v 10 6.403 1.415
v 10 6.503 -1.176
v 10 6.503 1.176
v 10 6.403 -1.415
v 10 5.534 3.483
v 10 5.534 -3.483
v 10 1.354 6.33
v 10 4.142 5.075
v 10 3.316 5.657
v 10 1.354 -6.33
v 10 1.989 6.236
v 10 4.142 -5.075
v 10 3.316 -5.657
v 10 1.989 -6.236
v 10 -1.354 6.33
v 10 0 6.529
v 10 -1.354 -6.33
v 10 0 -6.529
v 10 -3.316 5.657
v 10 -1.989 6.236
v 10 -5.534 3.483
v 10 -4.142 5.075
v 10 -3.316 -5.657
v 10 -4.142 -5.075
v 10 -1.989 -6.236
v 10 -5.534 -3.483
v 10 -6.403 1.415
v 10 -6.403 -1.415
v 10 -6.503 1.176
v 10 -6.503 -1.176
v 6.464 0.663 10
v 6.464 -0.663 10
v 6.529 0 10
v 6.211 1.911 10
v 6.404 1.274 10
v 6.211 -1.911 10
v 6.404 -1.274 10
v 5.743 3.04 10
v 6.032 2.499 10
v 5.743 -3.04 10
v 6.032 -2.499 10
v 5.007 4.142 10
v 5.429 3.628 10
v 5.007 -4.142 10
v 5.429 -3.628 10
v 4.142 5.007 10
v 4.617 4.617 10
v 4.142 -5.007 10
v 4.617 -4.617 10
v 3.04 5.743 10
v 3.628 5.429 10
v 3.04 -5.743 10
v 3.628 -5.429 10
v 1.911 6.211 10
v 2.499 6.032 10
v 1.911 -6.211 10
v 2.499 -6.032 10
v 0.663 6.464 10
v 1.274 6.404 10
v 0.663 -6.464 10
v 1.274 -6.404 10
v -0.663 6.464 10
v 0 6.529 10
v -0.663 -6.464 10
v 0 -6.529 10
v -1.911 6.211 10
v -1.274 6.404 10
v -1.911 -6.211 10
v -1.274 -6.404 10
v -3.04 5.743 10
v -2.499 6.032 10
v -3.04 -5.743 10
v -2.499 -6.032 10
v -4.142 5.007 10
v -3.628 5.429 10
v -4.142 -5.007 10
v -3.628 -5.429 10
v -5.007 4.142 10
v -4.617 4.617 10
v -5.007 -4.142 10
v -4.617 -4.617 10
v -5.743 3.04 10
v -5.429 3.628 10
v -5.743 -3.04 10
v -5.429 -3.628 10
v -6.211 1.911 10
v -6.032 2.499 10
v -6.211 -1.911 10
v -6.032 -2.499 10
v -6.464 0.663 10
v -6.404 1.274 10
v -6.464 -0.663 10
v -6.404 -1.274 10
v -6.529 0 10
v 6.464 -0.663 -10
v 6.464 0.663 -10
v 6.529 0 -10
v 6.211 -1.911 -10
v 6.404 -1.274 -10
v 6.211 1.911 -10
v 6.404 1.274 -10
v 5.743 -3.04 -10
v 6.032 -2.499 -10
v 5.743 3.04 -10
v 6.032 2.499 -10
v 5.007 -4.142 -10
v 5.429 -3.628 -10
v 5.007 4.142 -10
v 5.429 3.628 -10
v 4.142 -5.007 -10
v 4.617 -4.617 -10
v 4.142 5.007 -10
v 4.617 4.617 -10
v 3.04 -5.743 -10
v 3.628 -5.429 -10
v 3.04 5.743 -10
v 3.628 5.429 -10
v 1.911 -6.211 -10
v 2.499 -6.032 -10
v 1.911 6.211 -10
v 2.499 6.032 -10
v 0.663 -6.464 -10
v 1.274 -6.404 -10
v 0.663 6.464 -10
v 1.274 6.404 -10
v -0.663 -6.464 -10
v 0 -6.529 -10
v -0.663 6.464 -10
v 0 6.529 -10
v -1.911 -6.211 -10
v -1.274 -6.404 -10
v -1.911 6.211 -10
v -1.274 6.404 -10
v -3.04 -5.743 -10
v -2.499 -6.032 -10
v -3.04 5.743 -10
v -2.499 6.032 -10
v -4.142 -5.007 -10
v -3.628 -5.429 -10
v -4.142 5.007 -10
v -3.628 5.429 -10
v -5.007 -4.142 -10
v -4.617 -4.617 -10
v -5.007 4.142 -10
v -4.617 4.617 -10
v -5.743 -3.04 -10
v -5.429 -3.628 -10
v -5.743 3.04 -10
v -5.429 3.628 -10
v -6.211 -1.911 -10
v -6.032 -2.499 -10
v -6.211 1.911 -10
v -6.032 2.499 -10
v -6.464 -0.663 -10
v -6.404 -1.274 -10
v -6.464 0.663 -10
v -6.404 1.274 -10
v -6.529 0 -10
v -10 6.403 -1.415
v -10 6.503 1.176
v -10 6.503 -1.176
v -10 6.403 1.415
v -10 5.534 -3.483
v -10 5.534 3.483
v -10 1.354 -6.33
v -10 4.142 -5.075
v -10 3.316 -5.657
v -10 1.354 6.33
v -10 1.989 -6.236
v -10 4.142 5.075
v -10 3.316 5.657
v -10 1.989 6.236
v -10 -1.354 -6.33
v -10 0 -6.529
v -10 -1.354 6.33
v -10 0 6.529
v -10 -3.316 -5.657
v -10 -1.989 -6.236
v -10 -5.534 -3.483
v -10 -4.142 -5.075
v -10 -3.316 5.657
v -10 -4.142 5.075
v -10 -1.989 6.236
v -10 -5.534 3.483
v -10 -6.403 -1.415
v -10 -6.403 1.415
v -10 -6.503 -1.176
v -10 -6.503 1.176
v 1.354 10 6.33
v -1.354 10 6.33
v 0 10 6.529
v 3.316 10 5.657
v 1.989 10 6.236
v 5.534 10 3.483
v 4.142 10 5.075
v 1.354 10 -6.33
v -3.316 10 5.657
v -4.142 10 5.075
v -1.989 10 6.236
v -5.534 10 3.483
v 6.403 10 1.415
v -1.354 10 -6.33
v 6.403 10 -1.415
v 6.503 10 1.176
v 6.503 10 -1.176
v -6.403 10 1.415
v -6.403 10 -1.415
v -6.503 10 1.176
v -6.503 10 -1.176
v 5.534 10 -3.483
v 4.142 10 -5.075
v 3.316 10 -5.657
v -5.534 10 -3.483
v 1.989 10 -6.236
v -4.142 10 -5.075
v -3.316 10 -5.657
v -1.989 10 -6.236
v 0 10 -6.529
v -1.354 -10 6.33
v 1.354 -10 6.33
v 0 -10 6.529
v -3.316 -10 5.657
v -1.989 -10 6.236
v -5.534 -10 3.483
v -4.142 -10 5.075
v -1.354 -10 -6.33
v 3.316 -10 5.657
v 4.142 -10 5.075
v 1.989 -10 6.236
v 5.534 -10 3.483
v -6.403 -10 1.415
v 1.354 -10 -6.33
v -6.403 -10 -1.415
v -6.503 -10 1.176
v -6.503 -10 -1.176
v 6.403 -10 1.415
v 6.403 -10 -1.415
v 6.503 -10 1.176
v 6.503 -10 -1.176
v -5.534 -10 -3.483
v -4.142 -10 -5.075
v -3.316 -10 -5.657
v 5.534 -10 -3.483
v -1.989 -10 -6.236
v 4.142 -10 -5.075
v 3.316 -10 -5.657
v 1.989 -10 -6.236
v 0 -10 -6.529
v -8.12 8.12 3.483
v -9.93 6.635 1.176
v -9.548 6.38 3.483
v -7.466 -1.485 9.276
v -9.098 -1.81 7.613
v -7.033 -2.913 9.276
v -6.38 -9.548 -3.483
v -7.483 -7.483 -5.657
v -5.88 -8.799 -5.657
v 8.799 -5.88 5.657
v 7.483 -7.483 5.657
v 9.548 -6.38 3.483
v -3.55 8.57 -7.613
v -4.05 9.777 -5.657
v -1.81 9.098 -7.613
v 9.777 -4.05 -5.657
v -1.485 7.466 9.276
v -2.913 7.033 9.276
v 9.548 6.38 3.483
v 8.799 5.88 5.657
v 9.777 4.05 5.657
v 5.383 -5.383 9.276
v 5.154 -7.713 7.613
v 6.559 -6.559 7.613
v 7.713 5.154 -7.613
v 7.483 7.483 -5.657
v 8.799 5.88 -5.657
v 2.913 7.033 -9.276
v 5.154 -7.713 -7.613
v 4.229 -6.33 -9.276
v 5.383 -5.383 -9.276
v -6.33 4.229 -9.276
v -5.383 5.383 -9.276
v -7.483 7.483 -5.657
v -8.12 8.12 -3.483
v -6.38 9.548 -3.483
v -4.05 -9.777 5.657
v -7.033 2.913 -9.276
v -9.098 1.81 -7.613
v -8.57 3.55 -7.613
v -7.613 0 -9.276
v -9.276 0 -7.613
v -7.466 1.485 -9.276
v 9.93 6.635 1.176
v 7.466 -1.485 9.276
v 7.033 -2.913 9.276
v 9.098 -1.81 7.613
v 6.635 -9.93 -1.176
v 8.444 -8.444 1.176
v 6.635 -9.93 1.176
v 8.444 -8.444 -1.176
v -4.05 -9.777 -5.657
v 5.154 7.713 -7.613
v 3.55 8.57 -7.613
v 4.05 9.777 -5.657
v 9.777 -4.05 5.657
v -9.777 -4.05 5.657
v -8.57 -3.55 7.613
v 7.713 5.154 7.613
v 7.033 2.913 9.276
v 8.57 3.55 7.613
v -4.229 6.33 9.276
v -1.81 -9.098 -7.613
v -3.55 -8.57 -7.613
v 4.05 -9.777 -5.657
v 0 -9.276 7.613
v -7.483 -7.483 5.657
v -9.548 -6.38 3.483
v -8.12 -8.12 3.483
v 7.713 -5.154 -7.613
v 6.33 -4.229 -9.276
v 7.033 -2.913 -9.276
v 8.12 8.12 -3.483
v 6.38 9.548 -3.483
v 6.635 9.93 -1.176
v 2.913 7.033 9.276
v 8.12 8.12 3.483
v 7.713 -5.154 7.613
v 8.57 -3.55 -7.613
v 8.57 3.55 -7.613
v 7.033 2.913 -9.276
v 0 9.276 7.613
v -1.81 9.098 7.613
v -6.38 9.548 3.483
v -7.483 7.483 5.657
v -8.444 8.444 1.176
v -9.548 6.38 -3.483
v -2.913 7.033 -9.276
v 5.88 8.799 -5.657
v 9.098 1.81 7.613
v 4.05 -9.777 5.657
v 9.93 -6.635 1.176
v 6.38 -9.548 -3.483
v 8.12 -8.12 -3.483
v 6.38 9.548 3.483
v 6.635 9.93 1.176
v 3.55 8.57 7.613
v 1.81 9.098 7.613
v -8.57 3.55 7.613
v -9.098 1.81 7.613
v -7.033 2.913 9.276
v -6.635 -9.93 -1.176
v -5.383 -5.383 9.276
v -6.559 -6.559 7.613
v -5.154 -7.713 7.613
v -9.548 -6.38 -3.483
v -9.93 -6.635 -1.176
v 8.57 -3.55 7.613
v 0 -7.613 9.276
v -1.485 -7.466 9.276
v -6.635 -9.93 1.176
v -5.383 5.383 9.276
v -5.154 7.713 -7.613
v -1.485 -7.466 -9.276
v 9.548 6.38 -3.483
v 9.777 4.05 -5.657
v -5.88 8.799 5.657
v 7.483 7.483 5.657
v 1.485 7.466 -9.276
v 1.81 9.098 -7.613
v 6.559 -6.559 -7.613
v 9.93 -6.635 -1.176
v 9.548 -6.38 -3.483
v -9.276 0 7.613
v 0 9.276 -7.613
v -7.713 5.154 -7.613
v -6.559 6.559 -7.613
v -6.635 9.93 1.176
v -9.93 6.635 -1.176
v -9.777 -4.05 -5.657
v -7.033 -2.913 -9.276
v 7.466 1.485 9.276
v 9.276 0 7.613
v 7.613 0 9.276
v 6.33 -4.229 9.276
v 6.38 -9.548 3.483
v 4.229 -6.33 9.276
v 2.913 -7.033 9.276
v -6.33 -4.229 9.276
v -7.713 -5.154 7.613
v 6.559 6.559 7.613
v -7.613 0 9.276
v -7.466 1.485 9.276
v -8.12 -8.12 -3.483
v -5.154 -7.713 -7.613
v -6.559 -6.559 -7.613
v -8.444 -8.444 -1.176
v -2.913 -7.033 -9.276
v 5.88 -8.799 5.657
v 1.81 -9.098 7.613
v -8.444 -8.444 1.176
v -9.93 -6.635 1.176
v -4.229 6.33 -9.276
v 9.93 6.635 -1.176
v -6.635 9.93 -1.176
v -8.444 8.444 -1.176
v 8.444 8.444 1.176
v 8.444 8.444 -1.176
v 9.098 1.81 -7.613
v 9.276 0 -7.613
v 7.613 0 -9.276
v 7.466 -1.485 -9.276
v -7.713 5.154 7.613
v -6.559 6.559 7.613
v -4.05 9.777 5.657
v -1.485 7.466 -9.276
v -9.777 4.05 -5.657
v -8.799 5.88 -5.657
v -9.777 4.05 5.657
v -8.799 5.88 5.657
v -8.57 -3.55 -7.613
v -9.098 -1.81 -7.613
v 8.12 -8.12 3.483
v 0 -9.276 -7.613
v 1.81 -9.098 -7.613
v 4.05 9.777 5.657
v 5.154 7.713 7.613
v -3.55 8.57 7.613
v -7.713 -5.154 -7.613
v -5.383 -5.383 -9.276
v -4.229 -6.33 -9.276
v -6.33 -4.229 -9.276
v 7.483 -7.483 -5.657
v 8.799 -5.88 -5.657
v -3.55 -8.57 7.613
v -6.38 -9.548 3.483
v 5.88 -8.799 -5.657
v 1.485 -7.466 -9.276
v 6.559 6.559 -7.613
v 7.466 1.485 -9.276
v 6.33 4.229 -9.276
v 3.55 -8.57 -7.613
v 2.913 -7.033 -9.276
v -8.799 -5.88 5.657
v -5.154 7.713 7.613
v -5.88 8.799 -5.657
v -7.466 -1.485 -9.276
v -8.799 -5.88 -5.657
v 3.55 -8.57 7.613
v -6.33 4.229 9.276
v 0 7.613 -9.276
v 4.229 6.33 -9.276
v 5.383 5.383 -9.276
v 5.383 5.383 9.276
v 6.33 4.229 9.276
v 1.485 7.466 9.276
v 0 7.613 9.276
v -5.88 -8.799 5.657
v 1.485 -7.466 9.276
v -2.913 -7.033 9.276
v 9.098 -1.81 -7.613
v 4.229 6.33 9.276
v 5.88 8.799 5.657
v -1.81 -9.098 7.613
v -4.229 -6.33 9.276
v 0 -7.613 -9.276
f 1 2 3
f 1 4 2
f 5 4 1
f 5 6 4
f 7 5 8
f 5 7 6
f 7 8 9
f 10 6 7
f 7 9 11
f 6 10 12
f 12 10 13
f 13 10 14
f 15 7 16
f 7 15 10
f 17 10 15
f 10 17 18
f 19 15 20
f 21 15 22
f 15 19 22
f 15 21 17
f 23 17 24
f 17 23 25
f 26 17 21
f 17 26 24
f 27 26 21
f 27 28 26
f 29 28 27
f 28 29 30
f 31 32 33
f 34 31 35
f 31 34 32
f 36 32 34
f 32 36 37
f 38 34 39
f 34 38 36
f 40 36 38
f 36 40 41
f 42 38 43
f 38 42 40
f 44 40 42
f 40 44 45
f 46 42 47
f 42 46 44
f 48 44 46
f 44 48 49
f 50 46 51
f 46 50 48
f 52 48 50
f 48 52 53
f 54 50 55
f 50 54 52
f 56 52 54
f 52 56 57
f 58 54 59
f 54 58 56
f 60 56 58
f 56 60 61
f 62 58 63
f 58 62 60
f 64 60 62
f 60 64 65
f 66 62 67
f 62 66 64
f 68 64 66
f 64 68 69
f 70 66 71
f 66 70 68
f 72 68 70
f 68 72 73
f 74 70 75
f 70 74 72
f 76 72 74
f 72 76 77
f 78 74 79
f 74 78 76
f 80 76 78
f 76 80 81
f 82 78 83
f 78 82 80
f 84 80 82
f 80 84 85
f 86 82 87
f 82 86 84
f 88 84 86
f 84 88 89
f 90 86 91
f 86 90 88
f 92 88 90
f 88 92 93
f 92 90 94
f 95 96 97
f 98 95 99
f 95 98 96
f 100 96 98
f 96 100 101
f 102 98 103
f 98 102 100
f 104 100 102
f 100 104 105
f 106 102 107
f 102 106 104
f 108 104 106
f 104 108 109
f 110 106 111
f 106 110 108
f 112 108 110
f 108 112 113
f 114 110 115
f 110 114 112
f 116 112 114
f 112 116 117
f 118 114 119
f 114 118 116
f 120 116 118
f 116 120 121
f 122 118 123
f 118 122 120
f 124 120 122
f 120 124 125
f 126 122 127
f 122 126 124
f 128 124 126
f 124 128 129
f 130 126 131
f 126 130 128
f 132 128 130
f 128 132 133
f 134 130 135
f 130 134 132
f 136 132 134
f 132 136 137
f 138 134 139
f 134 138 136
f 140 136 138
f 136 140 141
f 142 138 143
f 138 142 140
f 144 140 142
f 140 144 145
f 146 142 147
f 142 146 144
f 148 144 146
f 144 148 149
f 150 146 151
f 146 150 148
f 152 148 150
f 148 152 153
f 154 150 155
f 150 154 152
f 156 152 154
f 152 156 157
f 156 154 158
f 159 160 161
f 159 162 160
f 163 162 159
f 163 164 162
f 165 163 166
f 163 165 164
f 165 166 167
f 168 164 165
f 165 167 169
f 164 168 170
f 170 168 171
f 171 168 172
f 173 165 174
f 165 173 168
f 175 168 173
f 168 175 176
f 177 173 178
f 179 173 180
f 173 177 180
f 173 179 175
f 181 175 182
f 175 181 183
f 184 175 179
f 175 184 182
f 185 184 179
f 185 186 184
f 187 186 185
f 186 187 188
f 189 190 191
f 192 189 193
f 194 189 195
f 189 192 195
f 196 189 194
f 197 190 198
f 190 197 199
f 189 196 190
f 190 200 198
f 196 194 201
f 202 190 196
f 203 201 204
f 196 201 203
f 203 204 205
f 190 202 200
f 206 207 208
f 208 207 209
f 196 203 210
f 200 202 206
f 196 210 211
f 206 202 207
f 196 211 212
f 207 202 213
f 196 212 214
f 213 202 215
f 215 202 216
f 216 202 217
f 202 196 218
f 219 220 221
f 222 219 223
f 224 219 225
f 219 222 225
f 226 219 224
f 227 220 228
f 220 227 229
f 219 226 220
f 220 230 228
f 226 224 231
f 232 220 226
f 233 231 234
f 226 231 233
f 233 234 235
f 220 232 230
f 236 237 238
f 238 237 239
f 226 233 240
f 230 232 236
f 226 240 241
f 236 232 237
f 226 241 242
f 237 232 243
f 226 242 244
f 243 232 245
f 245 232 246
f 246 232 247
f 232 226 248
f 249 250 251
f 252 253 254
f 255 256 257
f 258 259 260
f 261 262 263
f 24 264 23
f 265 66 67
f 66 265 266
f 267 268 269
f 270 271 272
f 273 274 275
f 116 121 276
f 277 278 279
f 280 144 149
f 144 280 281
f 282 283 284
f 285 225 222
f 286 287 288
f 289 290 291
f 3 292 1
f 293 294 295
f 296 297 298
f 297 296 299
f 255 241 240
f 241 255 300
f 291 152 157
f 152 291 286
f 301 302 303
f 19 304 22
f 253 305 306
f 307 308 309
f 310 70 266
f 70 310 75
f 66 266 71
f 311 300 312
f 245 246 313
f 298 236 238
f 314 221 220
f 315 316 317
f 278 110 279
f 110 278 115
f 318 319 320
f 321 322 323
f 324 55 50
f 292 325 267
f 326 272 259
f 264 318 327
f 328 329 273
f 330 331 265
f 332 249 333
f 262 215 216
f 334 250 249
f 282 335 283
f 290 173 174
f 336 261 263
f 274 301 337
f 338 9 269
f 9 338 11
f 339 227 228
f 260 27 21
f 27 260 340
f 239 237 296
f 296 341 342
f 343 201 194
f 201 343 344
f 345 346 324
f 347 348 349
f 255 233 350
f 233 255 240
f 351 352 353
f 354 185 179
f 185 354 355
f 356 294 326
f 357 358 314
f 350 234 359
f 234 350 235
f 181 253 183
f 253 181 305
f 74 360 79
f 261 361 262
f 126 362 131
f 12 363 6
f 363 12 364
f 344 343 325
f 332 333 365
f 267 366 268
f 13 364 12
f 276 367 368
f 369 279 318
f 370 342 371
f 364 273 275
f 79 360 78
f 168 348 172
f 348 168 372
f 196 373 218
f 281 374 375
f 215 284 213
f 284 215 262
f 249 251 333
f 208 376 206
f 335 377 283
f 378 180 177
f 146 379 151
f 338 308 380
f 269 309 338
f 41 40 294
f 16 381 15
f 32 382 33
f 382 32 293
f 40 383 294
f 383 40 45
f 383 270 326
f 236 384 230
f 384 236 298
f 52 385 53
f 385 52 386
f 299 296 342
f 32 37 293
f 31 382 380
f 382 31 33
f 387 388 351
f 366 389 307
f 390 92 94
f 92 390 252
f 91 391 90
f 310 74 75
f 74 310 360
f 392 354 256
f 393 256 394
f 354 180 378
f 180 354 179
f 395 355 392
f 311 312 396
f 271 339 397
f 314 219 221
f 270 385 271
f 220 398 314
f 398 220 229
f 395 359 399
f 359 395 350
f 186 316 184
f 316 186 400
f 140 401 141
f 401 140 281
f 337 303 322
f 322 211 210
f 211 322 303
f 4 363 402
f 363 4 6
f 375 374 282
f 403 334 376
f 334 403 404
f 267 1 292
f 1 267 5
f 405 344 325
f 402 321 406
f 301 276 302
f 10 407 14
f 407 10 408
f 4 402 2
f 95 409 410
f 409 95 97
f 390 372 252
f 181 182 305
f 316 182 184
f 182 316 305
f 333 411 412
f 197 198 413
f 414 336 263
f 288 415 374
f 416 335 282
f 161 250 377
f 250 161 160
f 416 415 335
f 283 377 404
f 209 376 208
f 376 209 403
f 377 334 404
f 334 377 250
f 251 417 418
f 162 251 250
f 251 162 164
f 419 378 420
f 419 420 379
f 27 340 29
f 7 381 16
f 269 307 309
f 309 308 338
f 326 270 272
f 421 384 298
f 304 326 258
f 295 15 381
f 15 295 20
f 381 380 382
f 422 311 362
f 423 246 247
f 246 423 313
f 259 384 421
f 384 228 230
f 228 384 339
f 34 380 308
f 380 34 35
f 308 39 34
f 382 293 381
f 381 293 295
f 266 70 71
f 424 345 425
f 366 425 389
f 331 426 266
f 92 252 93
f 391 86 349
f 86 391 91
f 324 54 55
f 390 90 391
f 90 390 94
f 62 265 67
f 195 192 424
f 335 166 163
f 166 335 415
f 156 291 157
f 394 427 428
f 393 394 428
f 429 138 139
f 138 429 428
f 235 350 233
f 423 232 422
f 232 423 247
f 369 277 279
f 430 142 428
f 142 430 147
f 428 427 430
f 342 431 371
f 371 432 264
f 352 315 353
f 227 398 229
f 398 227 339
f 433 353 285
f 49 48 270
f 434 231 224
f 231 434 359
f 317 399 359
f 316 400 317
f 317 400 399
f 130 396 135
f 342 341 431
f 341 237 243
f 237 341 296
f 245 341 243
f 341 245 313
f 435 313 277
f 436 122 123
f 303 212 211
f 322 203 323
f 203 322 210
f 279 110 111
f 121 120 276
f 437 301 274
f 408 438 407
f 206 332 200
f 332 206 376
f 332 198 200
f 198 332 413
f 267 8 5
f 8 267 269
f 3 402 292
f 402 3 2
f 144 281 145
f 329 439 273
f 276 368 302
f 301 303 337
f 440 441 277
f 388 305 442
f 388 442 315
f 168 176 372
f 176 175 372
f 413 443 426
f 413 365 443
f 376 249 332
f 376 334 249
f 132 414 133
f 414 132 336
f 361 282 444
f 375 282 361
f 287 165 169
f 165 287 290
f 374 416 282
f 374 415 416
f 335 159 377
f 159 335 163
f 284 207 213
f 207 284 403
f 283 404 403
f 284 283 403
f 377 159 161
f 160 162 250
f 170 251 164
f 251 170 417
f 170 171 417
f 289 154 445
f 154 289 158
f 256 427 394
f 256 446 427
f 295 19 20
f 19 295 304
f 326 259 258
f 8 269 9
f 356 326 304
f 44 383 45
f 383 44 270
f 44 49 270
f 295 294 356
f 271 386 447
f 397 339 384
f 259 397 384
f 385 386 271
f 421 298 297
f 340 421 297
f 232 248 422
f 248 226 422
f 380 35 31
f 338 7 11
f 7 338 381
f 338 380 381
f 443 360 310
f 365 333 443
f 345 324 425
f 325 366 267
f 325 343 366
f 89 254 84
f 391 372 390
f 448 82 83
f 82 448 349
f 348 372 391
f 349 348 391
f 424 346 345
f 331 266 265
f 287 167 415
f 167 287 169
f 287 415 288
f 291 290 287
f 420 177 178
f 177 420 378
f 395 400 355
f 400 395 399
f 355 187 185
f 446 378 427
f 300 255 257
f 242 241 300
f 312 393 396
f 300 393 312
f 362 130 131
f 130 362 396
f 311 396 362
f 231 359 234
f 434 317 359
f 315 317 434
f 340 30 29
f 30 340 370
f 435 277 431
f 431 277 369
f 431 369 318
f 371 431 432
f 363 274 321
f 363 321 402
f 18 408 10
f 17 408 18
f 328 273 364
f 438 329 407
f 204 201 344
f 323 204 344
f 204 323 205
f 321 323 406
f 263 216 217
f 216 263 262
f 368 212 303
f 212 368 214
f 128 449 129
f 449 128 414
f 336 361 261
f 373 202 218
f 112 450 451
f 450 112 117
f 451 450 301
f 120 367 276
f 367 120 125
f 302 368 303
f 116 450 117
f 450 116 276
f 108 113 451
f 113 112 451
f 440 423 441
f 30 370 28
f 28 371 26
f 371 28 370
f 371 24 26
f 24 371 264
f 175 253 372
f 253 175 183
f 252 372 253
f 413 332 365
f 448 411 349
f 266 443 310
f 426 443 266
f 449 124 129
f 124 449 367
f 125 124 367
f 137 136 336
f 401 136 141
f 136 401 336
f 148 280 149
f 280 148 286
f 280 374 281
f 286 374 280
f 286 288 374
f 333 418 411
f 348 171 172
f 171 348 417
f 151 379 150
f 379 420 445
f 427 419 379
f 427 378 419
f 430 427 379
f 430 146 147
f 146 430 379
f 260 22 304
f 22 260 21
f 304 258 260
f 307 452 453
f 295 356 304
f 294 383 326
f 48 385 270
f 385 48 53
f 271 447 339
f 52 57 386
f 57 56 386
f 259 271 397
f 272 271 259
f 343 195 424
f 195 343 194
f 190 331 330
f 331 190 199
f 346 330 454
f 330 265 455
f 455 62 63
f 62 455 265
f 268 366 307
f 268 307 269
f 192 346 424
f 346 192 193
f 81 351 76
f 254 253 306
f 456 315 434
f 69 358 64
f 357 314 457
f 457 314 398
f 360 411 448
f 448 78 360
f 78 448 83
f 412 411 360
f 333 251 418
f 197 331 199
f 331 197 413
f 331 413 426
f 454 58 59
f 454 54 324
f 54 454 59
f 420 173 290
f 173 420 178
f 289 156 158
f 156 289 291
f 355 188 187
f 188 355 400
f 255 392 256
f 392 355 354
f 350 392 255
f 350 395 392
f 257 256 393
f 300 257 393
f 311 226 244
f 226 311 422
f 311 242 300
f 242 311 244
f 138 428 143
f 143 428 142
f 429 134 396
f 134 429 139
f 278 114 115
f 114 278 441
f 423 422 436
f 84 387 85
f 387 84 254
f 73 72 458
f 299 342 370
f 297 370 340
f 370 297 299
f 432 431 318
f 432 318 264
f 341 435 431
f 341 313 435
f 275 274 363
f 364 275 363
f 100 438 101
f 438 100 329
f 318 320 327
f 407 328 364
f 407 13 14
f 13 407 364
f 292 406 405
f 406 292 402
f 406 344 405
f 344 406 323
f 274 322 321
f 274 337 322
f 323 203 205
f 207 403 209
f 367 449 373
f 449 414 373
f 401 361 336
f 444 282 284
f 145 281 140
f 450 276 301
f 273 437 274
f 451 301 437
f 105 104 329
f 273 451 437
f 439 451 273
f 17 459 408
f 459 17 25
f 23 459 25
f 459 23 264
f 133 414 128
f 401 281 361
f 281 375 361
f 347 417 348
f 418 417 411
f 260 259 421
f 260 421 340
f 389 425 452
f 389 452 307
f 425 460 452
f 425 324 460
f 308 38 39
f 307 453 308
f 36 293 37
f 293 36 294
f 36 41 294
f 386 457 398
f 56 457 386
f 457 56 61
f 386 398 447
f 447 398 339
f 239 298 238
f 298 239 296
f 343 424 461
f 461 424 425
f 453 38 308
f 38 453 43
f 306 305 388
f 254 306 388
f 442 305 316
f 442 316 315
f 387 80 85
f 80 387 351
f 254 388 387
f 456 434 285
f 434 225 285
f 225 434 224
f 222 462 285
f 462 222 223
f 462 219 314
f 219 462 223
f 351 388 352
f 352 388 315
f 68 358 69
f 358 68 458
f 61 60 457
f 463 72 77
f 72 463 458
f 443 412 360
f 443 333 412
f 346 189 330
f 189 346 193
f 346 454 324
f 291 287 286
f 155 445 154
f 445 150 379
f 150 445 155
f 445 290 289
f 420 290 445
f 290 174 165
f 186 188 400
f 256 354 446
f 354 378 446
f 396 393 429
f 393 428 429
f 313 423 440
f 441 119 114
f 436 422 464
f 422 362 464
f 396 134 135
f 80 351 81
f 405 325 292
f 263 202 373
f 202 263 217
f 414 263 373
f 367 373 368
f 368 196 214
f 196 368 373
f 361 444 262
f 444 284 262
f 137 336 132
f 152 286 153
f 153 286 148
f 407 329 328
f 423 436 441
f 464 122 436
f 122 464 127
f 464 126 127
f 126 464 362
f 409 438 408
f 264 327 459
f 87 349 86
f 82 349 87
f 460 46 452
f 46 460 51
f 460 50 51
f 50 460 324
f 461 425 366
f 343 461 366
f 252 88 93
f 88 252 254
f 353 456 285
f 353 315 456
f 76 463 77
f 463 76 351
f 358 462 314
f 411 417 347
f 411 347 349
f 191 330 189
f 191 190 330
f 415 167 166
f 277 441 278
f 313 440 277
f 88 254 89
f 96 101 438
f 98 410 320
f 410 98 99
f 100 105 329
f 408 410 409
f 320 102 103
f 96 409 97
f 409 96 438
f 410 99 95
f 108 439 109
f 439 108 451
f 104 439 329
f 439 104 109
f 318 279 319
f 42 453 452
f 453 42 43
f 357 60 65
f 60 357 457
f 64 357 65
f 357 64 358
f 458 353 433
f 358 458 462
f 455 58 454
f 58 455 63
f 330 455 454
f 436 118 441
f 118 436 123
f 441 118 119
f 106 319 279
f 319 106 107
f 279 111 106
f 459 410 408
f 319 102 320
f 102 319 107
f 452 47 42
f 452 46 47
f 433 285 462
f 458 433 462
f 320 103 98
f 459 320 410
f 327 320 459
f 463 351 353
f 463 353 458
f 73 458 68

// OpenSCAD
intersection() {
  cube([20, 20, 20], center = true);
  sphere(r = 12, $fn = 32);
}
